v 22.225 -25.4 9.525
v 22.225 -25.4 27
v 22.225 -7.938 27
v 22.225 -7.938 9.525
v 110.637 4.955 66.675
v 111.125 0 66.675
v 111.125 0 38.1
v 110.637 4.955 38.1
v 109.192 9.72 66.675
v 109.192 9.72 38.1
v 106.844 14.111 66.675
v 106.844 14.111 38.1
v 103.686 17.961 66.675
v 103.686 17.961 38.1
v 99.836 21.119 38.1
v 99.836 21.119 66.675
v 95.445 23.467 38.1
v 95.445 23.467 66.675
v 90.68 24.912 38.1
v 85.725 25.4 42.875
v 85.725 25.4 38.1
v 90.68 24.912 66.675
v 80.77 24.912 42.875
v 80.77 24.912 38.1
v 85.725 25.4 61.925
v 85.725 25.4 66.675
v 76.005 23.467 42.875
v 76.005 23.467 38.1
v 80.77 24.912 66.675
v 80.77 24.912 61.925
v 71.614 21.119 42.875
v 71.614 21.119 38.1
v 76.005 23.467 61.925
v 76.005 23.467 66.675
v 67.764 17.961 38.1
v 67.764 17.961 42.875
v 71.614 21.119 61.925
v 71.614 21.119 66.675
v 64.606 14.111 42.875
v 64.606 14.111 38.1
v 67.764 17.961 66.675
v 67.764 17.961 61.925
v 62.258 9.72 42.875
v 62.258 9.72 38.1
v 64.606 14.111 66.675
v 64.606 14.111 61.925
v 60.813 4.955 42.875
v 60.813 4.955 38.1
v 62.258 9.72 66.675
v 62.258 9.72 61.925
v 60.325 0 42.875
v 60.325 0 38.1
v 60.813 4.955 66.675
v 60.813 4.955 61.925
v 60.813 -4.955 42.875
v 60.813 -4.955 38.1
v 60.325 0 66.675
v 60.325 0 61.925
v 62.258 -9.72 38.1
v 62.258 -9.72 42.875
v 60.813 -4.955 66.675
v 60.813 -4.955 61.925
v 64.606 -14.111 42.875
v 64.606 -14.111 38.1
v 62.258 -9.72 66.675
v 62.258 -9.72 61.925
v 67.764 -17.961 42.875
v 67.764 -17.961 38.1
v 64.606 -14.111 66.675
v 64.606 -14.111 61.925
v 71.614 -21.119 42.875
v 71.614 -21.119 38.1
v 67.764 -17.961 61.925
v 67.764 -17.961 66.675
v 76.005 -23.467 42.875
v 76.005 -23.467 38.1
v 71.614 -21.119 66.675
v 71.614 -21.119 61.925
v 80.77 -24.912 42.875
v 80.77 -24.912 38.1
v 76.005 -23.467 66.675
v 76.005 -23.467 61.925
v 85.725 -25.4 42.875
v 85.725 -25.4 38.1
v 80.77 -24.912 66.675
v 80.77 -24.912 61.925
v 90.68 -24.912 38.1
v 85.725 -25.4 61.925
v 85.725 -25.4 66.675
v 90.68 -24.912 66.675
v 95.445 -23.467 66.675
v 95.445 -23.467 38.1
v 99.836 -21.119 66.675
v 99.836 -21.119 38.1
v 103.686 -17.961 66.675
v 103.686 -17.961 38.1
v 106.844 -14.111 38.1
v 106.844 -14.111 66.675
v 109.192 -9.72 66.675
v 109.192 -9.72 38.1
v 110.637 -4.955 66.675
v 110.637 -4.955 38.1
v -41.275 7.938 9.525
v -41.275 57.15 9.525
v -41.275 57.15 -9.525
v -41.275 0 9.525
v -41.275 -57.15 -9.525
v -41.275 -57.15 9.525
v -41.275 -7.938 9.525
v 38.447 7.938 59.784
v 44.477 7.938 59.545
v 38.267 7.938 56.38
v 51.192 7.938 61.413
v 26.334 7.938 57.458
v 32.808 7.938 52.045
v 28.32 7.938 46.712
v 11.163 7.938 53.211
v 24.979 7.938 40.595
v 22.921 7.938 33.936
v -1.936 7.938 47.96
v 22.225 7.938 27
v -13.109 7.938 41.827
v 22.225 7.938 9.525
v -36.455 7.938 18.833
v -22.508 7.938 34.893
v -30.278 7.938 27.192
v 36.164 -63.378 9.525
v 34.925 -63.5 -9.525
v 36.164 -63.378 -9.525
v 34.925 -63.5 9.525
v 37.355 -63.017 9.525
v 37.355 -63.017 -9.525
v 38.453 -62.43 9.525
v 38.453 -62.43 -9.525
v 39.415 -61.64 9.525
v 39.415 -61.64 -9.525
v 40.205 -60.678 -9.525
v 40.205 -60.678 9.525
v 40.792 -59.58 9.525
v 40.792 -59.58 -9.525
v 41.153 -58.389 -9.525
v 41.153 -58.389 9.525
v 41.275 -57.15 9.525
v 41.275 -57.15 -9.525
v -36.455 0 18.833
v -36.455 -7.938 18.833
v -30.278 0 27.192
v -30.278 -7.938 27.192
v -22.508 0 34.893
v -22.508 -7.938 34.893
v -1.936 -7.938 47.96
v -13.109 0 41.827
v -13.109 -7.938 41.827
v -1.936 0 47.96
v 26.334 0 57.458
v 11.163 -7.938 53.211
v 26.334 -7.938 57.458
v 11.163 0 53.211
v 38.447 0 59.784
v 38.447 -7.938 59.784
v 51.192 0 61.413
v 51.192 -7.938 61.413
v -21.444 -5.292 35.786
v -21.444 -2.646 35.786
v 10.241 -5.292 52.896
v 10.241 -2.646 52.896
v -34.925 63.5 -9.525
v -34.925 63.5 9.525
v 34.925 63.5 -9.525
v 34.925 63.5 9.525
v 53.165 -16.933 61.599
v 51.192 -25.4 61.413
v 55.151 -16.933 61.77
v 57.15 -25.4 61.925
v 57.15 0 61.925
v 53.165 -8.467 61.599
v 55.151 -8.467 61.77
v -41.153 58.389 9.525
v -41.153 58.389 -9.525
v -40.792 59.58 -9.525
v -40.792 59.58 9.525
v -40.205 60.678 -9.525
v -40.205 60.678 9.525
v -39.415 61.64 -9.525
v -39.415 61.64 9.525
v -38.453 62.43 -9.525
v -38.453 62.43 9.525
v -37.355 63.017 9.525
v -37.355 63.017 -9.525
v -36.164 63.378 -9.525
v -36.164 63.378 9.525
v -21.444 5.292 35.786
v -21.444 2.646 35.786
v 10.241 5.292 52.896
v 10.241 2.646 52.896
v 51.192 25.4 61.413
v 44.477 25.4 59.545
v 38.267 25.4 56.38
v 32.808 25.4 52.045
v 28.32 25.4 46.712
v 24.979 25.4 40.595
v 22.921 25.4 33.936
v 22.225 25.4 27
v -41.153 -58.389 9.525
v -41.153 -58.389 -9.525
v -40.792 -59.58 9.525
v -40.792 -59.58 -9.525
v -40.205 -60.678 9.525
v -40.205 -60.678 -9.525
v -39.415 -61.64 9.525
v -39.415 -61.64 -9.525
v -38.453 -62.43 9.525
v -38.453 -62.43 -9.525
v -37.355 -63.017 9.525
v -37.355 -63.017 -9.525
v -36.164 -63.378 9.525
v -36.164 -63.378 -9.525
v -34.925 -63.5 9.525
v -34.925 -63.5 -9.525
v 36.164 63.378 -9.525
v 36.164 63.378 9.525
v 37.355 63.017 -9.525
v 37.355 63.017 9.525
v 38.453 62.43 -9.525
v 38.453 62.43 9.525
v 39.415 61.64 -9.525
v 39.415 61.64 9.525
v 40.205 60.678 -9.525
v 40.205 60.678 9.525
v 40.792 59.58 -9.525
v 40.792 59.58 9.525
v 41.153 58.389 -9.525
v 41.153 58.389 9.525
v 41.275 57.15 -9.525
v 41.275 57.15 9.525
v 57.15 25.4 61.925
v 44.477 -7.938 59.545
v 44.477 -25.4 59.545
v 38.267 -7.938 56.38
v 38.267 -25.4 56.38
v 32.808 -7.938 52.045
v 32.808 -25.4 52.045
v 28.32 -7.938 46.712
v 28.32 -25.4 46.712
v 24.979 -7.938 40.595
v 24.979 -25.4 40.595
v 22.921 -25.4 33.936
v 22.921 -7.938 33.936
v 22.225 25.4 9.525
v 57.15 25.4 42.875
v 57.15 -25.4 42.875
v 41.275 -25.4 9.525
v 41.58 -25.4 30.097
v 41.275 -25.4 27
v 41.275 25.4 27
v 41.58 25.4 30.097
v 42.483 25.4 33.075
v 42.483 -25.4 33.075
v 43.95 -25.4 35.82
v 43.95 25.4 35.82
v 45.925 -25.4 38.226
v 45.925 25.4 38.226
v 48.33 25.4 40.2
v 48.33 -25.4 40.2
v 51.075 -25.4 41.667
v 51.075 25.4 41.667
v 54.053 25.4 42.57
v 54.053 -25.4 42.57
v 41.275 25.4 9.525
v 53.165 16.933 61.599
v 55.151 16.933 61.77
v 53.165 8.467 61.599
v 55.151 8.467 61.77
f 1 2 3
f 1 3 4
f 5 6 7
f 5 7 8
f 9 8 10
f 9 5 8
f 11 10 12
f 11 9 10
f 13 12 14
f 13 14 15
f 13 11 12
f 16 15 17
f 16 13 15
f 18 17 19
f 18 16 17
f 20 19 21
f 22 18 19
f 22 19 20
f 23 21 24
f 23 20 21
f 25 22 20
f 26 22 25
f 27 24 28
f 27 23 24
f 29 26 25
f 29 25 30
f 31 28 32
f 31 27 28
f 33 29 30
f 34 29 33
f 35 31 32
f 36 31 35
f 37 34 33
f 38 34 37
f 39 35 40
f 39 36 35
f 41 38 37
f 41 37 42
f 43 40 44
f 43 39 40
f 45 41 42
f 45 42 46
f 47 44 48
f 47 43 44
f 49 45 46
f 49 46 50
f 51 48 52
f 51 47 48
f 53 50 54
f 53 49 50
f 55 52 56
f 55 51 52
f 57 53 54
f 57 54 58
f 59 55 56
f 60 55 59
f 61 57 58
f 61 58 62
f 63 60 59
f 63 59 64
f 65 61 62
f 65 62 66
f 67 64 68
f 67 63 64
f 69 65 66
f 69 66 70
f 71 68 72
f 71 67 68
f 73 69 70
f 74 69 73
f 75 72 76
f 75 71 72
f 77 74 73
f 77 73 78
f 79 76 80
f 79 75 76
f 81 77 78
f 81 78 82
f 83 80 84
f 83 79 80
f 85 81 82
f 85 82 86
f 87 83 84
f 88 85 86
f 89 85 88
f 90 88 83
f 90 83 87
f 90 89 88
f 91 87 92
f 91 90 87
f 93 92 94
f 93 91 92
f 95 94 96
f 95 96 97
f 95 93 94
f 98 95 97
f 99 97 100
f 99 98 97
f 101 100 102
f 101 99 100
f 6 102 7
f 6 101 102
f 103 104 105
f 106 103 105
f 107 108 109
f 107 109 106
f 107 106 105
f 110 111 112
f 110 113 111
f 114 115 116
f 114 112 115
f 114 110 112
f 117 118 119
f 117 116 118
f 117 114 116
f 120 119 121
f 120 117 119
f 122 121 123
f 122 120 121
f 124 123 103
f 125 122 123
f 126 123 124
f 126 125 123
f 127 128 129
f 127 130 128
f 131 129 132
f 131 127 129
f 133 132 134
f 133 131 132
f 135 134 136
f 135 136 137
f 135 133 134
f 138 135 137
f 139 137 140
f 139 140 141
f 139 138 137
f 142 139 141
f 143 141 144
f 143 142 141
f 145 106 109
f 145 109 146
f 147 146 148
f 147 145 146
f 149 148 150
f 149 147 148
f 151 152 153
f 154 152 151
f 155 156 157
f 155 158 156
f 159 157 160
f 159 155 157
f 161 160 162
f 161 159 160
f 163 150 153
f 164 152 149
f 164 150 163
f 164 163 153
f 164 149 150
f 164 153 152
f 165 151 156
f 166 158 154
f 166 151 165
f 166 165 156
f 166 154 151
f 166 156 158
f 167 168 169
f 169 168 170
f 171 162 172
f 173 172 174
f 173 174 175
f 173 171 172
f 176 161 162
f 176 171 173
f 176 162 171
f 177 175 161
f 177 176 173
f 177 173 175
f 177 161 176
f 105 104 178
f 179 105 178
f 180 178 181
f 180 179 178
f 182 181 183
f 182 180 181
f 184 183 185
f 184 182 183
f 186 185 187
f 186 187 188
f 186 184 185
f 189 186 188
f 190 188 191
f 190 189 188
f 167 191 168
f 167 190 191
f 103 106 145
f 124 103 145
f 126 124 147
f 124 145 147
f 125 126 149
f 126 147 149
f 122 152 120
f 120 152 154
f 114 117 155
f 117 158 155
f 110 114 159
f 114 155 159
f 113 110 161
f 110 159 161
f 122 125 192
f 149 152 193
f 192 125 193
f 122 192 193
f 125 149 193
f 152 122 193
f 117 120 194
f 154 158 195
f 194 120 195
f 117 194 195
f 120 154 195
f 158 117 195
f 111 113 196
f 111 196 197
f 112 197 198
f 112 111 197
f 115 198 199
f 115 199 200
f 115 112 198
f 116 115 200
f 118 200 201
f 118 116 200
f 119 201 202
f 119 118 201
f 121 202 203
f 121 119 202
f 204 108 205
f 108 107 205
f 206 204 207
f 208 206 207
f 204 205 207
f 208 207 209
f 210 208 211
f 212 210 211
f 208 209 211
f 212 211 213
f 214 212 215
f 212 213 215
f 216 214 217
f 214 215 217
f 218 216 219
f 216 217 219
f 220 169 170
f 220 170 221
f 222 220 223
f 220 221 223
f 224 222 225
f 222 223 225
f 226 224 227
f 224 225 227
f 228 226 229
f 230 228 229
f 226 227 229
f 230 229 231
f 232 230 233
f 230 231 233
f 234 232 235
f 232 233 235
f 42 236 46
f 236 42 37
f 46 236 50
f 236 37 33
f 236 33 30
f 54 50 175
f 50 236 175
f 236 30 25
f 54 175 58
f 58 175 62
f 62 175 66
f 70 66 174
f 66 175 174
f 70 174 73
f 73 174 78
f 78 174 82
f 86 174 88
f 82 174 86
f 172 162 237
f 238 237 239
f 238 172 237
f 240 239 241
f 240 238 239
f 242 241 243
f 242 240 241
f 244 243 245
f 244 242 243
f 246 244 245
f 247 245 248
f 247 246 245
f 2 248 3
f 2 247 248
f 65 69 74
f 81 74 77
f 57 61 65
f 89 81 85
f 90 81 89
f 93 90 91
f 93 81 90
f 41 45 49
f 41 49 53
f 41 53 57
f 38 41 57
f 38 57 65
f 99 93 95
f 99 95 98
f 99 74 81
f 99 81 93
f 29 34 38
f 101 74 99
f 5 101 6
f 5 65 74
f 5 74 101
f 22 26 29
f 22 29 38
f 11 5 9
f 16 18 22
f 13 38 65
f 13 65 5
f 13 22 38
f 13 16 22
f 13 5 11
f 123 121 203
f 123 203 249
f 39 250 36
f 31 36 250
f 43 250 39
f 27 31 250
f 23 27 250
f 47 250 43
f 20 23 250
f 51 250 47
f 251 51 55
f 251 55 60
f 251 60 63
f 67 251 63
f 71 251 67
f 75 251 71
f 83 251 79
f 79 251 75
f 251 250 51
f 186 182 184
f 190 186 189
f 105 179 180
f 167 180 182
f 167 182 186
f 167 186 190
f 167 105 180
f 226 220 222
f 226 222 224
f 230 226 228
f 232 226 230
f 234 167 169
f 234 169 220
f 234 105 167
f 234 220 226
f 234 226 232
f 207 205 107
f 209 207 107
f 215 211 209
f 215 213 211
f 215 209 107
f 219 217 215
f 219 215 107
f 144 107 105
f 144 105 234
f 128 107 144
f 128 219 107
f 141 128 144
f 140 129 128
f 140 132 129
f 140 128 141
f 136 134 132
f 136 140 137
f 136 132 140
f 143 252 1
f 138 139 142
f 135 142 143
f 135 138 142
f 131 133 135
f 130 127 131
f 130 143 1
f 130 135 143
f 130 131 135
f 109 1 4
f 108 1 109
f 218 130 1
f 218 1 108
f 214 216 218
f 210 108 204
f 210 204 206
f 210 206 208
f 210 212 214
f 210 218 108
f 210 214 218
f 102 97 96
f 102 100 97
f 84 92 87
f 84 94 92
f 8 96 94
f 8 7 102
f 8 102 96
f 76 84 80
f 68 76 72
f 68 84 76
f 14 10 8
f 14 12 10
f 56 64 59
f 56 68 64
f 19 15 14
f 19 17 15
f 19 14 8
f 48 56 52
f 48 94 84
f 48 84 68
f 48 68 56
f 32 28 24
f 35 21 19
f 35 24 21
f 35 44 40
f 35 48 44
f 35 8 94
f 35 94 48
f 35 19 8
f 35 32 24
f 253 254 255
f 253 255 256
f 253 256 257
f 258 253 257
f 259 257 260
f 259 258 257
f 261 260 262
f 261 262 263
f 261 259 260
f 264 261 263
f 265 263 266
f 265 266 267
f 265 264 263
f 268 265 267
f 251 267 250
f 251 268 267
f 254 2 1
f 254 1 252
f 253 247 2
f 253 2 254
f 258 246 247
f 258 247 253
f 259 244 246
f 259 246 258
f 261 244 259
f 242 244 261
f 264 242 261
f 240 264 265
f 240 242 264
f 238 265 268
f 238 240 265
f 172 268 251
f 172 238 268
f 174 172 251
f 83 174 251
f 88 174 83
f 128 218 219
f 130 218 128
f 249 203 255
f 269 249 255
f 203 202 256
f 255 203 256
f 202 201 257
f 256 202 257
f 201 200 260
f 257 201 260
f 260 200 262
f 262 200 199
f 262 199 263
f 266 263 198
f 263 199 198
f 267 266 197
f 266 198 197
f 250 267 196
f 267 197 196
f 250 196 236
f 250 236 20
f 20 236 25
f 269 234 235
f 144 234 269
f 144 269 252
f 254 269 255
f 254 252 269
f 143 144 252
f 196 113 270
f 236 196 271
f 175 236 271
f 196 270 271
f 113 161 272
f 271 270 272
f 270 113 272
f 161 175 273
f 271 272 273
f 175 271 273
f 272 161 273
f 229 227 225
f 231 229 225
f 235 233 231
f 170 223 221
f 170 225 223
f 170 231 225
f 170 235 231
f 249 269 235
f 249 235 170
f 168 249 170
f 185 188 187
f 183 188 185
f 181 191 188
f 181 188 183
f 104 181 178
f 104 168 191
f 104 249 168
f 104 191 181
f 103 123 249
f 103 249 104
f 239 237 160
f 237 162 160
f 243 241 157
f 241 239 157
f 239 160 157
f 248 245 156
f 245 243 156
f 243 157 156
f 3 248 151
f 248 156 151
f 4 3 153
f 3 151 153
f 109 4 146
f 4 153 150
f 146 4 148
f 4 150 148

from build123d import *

# Parameters (mm, degrees)
F1_DEPTH = 63.5
F2_DEPTH = 25.4
F0_W     = 25.4
F0_H     = 19.05
F3_DEPTH = 25.4
F5_DEPTH = 7.9375
F6_R     = 6.35


with BuildPart() as f1:
    # F0 (on Front) → F1 (new body, symmetric)
    with BuildSketch(Plane.XZ):
        Polygon((22.225, 9.525), (-41.275, 9.525), (-41.275, -9.525), (41.275, -9.525), (41.275, 9.525), align=None)
    extrude(amount=F1_DEPTH, both=True)

    # F0 (on Front) → F2 (join, symmetric)
    with BuildSketch(Plane.XZ):
        with BuildLine():
            Line((22.225, 27.0002), (22.225, 9.525))
            Line((22.225, 9.525), (41.275, 9.525))
            Line((41.275, 9.525), (41.275, 27.0002))
            ThreePointArc((41.275, 27.0002), (45.9246798487, 38.2255201513), (57.15, 42.8752))
            Line((57.15, 42.8752), (60.325, 42.8752))
            Line((60.325, 42.8752), (60.325, 61.9252))
            Line((60.325, 61.9252), (57.15, 61.9252))
            add(Edge.make_bspline(
                [(51.1919194088, 61.4132338777), (53.1588989286, 61.6071240271), (55.1452560975, 61.7777078906), (57.15, 61.9252)],
                knots=[106.8067988555, 106.8067988555, 106.8067988555, 106.8067988555, 111.5045361635, 111.5045361635, 111.5045361635, 111.5045361635], degree=3))
            ThreePointArc((51.1919194088, 61.4132338777), (30.4307036989, 49.4909721116), (22.225, 27.0002))
        make_face()
    extrude(amount=F2_DEPTH, both=True)

    # F0 (on Front) → F3 (join, symmetric)
    with BuildSketch(Plane.XZ):
        with Locations((73.025, 52.4002)):
            Rectangle(F0_W, F0_H)
    extrude(amount=F3_DEPTH, both=True)

    # F0 (on Front) → F4 (revolve)
    with BuildSketch(Plane.XZ):
        Polygon((85.725, 66.675), (85.725, 61.9252), (85.725, 42.8752), (85.725, 38.1), (111.125, 38.1), (111.125, 66.675), align=None)
    revolve(axis=Axis((85.725, 0, 52.3875), (0, 0, 1)))

    # F0 (on Front) → F5 (join, symmetric)
    with BuildSketch(Plane.XZ):
        with BuildLine():
            add(Edge.make_bspline(
                [(-41.275, 9.525), (-28.2331469097, 40.5493377049), (6.4710735747, 57.0049869219), (51.1919194088, 61.4132338777)],
                knots=[0, 0, 0, 0, 106.8067988555, 106.8067988555, 106.8067988555, 106.8067988555], degree=3))
            Line((-41.275, 9.525), (22.225, 9.525))
            Line((22.225, 9.525), (22.225, 27.0002))
            ThreePointArc((22.225, 27.0002), (30.4307036989, 49.4909721116), (51.1919194088, 61.4132338777))
        make_face()
    extrude(amount=F5_DEPTH, both=True)

    # F6
    f6_edges = [f1.edges().sort_by_distance(p)[0] for p in [
        (-41.275, -63.5, 0),
        (41.275, -63.5, 0),
        (41.275, 63.5, 0),
        (-41.275, 63.5, 0),
    ]]
    fillet(f6_edges, radius=F6_R)


solid = f1.part
